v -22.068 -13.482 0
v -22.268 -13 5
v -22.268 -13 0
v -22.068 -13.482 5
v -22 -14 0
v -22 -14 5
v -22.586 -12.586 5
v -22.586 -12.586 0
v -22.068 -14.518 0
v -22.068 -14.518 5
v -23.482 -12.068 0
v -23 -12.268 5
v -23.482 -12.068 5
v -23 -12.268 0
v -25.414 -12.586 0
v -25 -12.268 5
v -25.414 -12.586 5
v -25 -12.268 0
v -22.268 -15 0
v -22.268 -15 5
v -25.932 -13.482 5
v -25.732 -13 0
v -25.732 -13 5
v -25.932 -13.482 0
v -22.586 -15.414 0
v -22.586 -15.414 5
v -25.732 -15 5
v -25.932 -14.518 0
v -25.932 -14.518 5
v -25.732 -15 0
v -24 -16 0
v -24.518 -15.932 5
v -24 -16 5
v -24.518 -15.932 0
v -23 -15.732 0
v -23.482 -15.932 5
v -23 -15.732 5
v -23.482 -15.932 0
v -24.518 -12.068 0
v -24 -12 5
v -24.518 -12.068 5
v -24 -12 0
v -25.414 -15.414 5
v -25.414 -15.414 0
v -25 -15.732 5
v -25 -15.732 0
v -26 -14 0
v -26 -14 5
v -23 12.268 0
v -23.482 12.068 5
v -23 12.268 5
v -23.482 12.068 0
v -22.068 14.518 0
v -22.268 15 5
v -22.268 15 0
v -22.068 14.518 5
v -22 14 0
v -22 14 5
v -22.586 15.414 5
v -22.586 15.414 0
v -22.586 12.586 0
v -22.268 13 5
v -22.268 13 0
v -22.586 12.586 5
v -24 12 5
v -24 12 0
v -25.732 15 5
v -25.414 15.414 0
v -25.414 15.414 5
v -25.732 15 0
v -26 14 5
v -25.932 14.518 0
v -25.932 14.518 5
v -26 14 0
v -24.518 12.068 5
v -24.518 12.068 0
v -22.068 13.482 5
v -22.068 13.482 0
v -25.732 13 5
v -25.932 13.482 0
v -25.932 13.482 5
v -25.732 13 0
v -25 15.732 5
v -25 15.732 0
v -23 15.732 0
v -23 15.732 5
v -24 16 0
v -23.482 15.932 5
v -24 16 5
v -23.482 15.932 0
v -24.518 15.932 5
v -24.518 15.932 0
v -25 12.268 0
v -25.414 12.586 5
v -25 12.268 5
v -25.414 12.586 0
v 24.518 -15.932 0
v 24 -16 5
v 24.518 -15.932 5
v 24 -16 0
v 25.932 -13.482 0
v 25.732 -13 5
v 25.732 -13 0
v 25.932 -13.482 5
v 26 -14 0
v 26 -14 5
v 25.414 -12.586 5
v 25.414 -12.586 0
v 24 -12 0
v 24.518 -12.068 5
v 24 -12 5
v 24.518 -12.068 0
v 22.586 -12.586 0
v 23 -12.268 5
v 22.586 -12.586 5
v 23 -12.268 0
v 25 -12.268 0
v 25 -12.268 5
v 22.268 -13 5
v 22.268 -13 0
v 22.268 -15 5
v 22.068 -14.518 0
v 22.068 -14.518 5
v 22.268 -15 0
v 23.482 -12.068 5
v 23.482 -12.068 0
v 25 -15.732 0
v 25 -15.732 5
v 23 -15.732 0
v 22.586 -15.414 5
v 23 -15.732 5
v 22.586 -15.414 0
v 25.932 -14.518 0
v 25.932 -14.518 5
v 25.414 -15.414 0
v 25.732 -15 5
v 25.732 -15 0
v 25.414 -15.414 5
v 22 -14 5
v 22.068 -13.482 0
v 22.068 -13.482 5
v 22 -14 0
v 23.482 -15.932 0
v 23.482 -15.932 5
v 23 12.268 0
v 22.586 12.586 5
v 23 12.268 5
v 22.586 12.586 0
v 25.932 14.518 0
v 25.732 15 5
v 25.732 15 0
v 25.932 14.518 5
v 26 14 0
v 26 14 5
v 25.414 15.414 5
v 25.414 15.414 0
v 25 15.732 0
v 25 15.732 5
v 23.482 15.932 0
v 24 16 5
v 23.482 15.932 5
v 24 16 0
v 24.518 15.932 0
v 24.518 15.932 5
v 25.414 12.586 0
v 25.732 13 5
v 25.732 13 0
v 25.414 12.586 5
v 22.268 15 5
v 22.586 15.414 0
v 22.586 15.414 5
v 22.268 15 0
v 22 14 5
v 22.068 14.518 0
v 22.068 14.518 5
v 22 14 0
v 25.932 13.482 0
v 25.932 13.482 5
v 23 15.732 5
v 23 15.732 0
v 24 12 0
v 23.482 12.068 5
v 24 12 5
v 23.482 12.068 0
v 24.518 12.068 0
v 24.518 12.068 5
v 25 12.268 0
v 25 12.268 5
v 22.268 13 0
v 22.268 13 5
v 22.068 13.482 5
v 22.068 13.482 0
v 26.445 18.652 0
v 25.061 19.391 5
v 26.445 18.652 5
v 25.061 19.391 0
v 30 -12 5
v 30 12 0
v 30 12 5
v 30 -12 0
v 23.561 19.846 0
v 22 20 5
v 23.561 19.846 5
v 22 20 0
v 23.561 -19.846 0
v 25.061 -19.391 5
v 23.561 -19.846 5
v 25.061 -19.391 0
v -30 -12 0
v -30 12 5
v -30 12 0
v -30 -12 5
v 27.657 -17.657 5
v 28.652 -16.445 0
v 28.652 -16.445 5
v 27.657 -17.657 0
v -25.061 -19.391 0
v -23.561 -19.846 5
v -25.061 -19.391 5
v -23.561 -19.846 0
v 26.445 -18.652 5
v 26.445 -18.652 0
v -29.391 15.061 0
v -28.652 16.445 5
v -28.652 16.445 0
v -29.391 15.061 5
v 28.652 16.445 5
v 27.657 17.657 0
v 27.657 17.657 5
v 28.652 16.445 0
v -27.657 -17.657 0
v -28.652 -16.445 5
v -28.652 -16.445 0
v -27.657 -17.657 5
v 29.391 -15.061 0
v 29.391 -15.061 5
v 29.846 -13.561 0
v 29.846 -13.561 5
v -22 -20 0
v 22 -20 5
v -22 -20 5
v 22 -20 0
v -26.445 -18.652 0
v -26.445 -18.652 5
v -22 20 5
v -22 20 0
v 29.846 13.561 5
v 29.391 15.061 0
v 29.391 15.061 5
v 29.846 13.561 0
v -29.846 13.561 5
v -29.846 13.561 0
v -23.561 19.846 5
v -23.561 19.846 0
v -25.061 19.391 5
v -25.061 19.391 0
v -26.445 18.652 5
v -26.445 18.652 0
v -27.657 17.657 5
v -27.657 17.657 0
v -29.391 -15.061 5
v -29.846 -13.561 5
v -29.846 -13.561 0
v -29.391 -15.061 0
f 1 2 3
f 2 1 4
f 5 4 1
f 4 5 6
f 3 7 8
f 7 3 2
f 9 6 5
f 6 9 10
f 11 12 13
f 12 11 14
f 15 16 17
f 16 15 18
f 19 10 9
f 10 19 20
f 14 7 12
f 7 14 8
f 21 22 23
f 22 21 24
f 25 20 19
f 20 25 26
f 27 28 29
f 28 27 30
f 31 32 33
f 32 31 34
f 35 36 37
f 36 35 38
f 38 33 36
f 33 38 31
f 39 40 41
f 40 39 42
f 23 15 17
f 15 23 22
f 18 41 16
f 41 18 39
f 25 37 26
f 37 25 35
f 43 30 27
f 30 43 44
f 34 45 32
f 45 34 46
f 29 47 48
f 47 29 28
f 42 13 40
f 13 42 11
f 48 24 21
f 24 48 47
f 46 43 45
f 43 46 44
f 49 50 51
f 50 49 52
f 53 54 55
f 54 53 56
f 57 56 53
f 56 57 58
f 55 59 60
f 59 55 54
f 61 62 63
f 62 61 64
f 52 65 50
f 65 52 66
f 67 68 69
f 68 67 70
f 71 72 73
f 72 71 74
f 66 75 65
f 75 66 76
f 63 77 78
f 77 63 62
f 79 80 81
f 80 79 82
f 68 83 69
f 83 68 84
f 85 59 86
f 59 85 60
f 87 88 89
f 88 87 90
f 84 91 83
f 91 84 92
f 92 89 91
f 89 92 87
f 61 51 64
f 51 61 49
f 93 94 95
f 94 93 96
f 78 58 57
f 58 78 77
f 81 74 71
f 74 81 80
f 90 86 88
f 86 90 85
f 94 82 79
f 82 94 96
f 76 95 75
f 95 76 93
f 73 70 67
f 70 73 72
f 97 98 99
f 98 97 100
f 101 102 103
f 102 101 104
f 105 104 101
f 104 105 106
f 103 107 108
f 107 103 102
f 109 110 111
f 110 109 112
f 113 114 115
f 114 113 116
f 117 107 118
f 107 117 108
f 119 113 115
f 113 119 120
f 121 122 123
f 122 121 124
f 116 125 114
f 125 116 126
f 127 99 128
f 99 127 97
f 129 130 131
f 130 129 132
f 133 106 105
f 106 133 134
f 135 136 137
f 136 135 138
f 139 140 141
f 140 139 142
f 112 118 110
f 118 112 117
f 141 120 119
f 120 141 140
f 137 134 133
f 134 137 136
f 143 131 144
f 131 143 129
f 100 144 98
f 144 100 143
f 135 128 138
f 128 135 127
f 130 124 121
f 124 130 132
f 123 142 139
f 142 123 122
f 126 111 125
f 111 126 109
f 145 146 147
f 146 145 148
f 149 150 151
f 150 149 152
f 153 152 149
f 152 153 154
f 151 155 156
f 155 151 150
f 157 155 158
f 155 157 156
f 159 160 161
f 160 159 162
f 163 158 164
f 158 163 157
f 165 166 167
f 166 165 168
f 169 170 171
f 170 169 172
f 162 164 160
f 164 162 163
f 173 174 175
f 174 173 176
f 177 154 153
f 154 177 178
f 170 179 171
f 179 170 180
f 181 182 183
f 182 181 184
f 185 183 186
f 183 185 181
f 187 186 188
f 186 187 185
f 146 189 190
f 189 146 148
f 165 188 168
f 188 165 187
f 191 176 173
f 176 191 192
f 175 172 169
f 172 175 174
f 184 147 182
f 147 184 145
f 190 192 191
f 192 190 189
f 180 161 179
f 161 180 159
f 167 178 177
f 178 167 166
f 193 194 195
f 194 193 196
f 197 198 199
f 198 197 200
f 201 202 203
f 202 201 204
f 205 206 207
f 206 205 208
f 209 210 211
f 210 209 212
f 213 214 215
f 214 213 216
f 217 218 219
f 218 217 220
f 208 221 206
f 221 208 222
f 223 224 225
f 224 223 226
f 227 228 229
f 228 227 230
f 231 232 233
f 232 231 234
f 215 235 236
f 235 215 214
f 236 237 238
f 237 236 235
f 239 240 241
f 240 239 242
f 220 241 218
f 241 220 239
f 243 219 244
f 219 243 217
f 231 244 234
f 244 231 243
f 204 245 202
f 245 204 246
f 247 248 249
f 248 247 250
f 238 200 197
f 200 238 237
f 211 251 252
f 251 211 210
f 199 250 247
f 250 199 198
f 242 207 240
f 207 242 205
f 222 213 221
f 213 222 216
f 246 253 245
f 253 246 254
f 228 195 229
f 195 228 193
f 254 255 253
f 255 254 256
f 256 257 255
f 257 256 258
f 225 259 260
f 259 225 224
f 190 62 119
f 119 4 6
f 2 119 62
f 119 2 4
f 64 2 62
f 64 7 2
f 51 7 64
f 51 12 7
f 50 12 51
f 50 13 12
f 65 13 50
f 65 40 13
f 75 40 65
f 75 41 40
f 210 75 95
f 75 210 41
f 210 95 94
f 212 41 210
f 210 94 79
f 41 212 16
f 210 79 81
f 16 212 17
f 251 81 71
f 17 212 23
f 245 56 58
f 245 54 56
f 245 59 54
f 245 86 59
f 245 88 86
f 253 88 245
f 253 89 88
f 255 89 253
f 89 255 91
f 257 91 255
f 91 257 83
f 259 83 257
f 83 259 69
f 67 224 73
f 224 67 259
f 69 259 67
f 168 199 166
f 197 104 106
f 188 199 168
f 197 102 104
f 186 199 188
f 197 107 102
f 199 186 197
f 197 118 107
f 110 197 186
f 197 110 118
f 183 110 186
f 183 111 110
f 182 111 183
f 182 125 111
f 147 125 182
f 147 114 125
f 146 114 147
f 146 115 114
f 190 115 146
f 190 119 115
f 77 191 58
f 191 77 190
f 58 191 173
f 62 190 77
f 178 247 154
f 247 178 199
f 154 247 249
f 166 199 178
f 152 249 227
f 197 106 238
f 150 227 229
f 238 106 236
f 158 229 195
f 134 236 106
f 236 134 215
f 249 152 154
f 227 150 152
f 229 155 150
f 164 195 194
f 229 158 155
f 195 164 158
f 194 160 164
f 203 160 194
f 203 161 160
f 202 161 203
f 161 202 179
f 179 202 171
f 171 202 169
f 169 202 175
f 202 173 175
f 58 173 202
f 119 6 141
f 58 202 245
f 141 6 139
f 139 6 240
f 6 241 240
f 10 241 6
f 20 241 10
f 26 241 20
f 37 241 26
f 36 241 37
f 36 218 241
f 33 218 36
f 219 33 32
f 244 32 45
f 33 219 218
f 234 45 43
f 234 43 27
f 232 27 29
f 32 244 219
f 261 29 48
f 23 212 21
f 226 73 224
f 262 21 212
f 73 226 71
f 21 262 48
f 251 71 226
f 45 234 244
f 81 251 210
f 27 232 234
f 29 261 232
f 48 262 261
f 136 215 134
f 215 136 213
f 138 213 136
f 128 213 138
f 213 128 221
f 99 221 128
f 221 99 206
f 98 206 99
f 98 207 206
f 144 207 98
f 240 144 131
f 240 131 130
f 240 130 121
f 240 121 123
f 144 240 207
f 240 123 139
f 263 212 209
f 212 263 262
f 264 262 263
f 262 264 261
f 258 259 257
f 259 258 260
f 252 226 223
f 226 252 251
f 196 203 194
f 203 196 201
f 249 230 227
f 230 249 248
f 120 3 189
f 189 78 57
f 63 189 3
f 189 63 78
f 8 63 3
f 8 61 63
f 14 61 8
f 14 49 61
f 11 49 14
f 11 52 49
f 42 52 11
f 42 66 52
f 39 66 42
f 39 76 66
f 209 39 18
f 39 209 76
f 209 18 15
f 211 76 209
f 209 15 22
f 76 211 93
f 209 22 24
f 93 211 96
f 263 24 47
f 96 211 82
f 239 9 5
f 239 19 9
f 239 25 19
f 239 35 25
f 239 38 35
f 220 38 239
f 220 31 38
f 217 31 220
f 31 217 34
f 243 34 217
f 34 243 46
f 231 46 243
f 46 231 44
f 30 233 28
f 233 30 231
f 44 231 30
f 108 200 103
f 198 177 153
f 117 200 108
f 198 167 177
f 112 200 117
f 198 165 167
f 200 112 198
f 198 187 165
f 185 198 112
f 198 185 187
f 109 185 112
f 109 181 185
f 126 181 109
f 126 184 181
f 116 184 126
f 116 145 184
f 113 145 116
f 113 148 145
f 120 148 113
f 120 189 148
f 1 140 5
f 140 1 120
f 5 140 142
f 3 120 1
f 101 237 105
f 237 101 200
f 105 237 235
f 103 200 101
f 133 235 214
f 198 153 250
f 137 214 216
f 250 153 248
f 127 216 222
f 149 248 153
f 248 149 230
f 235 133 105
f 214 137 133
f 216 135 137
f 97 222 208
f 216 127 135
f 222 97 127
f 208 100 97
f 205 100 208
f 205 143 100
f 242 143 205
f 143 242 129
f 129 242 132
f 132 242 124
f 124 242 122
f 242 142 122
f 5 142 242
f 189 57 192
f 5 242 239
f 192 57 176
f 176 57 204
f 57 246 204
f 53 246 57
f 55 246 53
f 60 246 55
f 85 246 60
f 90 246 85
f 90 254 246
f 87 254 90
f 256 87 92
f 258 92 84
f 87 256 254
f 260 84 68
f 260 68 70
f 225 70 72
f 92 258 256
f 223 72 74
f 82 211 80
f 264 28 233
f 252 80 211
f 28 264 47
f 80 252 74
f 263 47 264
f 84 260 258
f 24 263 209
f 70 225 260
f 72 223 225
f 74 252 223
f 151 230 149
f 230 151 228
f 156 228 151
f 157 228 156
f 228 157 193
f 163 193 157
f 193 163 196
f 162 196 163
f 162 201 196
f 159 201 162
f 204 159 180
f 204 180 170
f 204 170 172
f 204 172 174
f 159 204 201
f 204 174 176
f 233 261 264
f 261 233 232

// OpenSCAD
// Modules: your own shapes, with parameters and defaults.

module rounded_plate(size=[40, 25, 4], r=5) {
    hull()
        for (x = [r - size[0]/2, size[0]/2 - r],
             y = [r - size[1]/2, size[1]/2 - r])
            translate([x, y, 0])
                cylinder(h=size[2], r=r, $fn=32);
}

module bolt_holes(size, inset=6, d=4) {
    for (x = [inset - size[0]/2, size[0]/2 - inset],
         y = [inset - size[1]/2, size[1]/2 - inset])
        translate([x, y, -1])
            cylinder(h=size[2] + 2, d=d, $fn=24);
}

plate = [60, 40, 5];
difference() {
    rounded_plate(plate, r=8);
    bolt_holes(plate);
}
